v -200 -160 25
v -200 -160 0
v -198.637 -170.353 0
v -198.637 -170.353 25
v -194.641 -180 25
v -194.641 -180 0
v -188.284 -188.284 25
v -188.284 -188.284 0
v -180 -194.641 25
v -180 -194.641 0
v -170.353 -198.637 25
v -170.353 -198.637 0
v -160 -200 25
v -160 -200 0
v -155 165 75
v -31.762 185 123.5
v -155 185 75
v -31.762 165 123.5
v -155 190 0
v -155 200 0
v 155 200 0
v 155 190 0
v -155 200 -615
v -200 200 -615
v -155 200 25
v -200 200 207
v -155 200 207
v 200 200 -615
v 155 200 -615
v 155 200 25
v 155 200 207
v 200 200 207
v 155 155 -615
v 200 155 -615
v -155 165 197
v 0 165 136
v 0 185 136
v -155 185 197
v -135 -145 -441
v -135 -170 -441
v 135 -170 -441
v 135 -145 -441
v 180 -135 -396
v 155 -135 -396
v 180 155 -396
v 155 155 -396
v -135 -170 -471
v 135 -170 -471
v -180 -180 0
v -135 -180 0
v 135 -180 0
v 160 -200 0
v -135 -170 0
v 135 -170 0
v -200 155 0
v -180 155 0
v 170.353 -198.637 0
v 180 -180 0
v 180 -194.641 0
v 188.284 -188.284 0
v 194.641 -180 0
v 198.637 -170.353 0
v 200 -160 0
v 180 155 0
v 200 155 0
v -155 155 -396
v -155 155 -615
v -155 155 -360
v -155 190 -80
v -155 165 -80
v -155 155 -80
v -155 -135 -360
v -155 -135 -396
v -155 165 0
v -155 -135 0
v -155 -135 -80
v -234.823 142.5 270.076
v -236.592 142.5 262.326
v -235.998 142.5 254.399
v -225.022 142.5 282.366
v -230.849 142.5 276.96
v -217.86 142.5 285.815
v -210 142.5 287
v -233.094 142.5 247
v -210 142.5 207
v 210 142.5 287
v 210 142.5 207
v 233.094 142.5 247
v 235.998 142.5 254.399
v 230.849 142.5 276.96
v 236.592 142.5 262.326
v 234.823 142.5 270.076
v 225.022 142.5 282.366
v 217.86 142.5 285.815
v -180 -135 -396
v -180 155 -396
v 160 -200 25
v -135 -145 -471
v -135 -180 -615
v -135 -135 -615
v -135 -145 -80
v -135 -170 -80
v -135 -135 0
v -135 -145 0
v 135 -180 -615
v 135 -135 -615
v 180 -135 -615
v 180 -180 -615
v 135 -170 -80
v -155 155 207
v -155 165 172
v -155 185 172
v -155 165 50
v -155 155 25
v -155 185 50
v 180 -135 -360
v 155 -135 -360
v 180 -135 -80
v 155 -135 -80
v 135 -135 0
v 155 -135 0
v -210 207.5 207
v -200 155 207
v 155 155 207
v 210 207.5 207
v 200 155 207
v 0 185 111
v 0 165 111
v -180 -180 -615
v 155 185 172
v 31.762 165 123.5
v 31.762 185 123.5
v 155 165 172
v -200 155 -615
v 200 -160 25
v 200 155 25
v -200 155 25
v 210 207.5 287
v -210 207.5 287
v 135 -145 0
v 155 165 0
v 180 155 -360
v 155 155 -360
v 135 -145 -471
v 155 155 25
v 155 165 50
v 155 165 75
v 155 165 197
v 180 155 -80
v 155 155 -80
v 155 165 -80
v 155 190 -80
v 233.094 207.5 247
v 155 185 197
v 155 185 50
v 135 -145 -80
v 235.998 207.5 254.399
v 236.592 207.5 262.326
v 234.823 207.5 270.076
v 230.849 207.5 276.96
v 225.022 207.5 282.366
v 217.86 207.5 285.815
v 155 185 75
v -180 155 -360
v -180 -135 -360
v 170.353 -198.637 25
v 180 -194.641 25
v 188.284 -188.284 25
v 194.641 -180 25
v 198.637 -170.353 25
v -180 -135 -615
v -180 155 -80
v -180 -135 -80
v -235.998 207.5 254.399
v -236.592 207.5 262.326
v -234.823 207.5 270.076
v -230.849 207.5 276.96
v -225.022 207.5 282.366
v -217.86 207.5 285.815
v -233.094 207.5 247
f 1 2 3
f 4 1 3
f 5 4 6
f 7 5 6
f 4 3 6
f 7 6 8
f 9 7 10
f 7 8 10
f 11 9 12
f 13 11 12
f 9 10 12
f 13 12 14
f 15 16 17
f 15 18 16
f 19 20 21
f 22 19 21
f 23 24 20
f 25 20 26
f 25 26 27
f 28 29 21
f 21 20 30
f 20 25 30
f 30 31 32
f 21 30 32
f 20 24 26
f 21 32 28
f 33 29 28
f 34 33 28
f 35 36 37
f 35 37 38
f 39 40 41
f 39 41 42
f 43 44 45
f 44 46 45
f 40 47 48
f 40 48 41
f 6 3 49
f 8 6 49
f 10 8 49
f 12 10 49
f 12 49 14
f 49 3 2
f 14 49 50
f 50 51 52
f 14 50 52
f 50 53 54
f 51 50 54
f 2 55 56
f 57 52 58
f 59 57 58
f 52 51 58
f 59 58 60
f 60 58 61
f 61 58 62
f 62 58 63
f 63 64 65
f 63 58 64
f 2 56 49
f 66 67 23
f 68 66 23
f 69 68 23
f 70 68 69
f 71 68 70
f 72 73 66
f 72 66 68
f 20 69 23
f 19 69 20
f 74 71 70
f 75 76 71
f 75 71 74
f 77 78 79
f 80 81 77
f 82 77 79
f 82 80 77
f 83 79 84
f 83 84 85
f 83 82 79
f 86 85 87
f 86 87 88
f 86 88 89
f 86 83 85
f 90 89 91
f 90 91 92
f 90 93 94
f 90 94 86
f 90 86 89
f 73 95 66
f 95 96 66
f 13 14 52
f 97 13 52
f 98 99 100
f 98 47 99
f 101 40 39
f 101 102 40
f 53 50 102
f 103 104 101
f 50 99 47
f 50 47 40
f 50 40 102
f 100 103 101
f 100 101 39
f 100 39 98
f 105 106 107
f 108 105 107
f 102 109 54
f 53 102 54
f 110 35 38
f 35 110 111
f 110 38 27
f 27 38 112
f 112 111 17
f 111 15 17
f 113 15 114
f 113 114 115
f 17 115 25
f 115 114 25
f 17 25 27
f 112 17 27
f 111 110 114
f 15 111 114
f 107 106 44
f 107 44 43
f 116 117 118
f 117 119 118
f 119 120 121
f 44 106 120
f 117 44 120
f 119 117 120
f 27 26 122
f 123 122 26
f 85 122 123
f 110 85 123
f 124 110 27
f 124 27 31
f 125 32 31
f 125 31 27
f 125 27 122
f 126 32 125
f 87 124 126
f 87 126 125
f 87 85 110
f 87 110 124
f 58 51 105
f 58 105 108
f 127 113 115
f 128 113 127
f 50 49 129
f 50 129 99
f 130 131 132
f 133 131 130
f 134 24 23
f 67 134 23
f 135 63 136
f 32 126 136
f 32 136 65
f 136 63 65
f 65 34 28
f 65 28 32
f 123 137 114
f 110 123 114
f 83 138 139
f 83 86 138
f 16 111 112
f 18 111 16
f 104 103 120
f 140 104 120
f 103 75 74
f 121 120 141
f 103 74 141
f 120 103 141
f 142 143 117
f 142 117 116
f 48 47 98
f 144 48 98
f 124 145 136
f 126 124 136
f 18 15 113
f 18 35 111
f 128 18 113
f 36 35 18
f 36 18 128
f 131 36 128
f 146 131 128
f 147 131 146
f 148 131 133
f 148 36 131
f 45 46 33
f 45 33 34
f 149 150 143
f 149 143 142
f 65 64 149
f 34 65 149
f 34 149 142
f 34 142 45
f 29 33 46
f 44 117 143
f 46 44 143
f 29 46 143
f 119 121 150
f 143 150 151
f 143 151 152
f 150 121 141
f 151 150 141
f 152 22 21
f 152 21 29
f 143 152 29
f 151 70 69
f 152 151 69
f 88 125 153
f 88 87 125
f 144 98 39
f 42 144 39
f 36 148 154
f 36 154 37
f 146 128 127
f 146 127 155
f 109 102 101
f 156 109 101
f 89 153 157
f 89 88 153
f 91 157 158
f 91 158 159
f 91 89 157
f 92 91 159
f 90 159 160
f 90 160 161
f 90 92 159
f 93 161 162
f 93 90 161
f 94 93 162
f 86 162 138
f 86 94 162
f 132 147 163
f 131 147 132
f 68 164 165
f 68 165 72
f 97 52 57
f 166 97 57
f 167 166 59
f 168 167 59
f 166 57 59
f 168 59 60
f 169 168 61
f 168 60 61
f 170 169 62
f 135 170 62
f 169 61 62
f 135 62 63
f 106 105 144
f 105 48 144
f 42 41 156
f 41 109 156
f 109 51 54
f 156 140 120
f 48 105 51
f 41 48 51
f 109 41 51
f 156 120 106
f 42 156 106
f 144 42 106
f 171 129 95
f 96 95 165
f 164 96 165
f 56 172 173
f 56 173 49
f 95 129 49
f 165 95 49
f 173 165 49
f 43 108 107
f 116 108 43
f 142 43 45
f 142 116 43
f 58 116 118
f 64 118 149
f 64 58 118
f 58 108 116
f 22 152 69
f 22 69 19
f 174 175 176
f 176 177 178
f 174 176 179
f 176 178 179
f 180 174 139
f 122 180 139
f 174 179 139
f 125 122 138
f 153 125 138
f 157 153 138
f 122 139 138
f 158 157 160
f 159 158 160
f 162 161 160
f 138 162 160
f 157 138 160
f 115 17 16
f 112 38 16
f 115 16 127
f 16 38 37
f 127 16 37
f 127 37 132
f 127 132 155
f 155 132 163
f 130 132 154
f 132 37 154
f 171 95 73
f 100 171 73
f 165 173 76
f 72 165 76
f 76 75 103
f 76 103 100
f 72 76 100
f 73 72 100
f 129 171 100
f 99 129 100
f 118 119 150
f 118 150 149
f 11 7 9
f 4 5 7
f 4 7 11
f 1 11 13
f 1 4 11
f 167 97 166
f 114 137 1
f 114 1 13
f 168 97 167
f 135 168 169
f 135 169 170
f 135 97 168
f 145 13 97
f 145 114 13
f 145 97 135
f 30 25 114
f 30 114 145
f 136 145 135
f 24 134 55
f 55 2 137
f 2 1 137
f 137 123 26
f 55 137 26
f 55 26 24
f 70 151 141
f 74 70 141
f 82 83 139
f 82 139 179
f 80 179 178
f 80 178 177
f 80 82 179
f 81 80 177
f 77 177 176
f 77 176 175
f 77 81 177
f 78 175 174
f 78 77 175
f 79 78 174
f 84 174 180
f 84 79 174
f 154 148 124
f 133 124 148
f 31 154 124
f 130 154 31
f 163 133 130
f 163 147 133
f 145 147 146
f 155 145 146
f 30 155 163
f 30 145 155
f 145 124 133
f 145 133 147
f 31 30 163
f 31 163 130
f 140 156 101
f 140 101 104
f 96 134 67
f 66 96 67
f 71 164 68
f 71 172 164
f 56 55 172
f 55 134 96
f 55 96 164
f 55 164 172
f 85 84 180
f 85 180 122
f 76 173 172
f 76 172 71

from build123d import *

# Parameters (mm, degrees)
F1_DEPTH      = 25
F2_W          = 45
F2_H          = 45
F3_DEPTH      = 615
F4_W          = 45
F4_H          = 45
F5_DEPTH      = 287
F5_DEPTH_BACK = 615
F6_W          = 25
F6_H          = 80
F6_H_2        = 36
F7_DEPTH      = 135
F7_DEPTH_BACK = 155
F8_W          = 25
F8_H          = 80
F8_H_2        = 30
F9_DEPTH      = 155
F9_DEPTH_BACK = 155
F12_DEPTH     = 32.5
F14_DEPTH     = 10


with BuildPart() as f1:
    # F0 (on Top) → F1 (new body)
    with BuildSketch(Plane.XY):
        with BuildLine():
            Line((155, 200), (-155, 200))
            Line((-155, 200), (-155, 155))
            Line((-155, 155), (-200, 155))
            Line((-200, 155), (-200, -160))
            ThreePointArc((-200, -160), (-188.2842712475, -188.2842712475), (-160, -200))
            Line((-160, -200), (160, -200))
            ThreePointArc((160, -200), (188.2842712475, -188.2842712475), (200, -160))
            Line((200, -160), (200, 155))
            Line((200, 155), (155, 155))
            Line((155, 155), (155, 200))
        make_face()
    extrude(amount=F1_DEPTH)

    # F2 (on Top) → F3 (join)
    with BuildSketch(Plane.XY):
        with Locations((157.5, -157.5)):
            Rectangle(F2_W, F2_H)
        with Locations((-157.5, -157.5)):
            Rectangle(F2_W, F2_H)
    extrude(amount=-F3_DEPTH)

    # F4 (on Top) → F5 (join, two sides)
    with BuildSketch(Plane.XY) as f5_sk:
        with Locations((-177.5, 177.5)):
            Rectangle(F4_W, F4_H)
        with Locations((177.5, 177.5)):
            Rectangle(F4_W, F4_H)
    extrude(amount=F5_DEPTH)
    extrude(f5_sk.sketch, amount=-F5_DEPTH_BACK)

    # F6 (on Front) → F7 (join, two sides)
    with BuildSketch(Plane.XZ) as f7_sk:
        with Locations((-167.5, -40)):
            Rectangle(F6_W, F6_H)
        with Locations((167.5, -40)):
            Rectangle(F6_W, F6_H)
        with Locations((-167.5, -378)):
            Rectangle(F6_W, F6_H_2)
        with Locations((167.5, -378)):
            Rectangle(F6_W, F6_H_2)
    extrude(amount=F7_DEPTH)
    extrude(f7_sk.sketch, amount=-F7_DEPTH_BACK)

    # F8 (on Right) → F9 (join, two sides)
    with BuildSketch(Plane.YZ) as f9_sk:
        with Locations((-157.5, -40)):
            Rectangle(F8_W, F8_H)
        with Locations((177.5, -40)):
            Rectangle(F8_W, F8_H)
        with Locations((-157.5, -456)):
            Rectangle(F8_W, F8_H_2)
    extrude(amount=F9_DEPTH)
    extrude(f9_sk.sketch, amount=-F9_DEPTH_BACK)

    # F11 (on offset) → F12 (join, symmetric)
    with BuildSketch(Plane.XZ.offset(-175)):
        with BuildLine():
            Line((210, 287), (-210, 287))
            ThreePointArc((-210, 287), (-233.0940107676, 273.6666666667), (-233.0940107676, 247))
            Line((-233.0940107676, 247), (-210, 207))
            Line((-210, 207), (210, 207))
            Line((210, 207), (233.0940107676, 247))
            ThreePointArc((233.0940107676, 247), (233.0940107676, 273.6666666667), (210, 287))
        make_face()
    extrude(amount=F12_DEPTH, both=True)

    # F13 (on offset) → F14 (join, symmetric)
    with BuildSketch(Plane.XZ.offset(-175)):
        Polygon((-155, 75), (-155, 50), (0, 111), (-31.762295082, 123.5), align=None)
        Polygon((-31.762295082, 123.5), (0, 111), (31.762295082, 123.5), (0, 136), align=None)
        Polygon((31.762295082, 123.5), (0, 111), (155, 50), (155, 75), align=None)
        Polygon((0, 136), (31.762295082, 123.5), (155, 172), (155, 197), align=None)
        Polygon((-155, 172), (-31.762295082, 123.5), (0, 136), (-155, 197), align=None)
    extrude(amount=F14_DEPTH, both=True)


solid = f1.part
